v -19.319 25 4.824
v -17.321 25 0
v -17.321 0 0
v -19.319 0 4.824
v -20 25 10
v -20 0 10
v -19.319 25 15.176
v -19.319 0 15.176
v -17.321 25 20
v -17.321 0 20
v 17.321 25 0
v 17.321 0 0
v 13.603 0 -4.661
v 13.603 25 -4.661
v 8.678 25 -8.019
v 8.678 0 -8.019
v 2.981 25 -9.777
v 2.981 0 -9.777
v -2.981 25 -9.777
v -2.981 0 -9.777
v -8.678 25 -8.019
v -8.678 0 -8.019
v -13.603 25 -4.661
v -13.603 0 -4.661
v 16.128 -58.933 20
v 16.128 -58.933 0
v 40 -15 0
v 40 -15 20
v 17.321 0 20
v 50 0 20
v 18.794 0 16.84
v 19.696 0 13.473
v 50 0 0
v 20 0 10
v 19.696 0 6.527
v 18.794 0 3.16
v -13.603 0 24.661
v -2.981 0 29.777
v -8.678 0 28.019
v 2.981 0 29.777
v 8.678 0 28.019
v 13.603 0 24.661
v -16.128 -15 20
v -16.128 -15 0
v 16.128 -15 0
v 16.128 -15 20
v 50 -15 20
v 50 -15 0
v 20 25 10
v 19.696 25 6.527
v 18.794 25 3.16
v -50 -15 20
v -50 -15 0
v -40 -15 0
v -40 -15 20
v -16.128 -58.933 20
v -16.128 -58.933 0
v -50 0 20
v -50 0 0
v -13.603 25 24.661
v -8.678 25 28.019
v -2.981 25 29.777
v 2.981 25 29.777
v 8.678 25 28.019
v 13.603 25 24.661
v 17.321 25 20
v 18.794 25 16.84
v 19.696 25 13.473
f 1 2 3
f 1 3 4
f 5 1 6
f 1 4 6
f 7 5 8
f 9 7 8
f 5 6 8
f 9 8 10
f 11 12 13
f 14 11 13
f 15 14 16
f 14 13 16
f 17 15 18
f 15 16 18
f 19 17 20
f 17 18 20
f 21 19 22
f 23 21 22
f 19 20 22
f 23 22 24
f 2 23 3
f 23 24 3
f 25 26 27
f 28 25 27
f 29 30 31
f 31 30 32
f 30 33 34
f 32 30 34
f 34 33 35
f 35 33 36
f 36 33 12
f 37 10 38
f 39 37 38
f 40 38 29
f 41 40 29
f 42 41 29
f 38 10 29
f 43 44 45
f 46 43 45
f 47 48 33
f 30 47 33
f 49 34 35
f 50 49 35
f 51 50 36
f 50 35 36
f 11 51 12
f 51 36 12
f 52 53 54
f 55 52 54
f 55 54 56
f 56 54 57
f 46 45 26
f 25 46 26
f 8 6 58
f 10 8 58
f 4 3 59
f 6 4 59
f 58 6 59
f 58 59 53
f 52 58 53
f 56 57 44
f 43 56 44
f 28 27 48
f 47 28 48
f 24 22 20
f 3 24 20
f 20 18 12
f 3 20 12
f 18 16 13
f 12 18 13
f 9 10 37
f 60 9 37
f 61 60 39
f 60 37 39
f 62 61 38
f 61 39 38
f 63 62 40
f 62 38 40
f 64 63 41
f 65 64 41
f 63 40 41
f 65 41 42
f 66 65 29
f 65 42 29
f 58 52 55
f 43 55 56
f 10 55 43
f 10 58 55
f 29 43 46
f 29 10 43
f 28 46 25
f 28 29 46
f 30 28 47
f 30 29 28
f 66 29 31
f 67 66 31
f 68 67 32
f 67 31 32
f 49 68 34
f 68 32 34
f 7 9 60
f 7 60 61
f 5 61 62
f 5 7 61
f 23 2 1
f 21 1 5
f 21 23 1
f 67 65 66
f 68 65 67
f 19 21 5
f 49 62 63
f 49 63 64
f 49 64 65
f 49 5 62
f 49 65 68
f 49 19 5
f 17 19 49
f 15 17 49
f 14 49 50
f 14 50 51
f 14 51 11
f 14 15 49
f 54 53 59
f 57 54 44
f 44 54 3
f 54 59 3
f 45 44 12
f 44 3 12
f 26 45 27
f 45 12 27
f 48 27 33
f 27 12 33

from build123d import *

# Parameters (mm, degrees)
EXTRUDE_1_DEPTH = 20
EXTRUDE_2_DEPTH = 25


with BuildPart() as part:
    # 草图3 → 凸台-拉伸1 (new body)
    with BuildSketch(Plane.XY):
        Polygon((0, -15), (0, 0), (-50, 0), (-50, -15), (-40, -15), (-16.127693207, -58.93305098), (-16.127693207, -15), align=None)
        Polygon((50, -15), (50, 0), (0, 0), (0, -15), (16.127693207, -15), (16.127693207, -58.93305098), (40, -15), align=None)
    extrude(amount=EXTRUDE_1_DEPTH)

    # 草图4 → 凸台-拉伸2 (add)
    with BuildSketch(Plane(origin=(0, 0, 0), x_dir=(1, 0, 0), z_dir=(0, 1, 0))):
        with BuildLine():
            Line((17.320508076, -20), (0, -20))
            Line((0, -20), (-17.320508076, -20))
            ThreePointArc((-17.320508076, -20), (0, -30), (17.320508076, -20))
        make_face()
        with BuildLine():
            Line((17.320508076, 0), (0, 0))
            Line((0, 0), (0, -20))
            Line((0, -20), (17.320508076, -20))
            ThreePointArc((17.320508076, -20), (19.318516526, -15.176380902), (20, -10))
            ThreePointArc((20, -10), (19.318516526, -4.823619098), (17.320508076, 0))
        make_face()
        with BuildLine():
            Line((0, -20), (0, 0))
            Line((0, 0), (-17.320508076, 0))
            ThreePointArc((-17.320508076, 0), (-20, -10), (-17.320508076, -20))
            Line((-17.320508076, -20), (0, -20))
        make_face()
        with BuildLine():
            Line((-17.320508076, 0), (0, 0))
            Line((0, 0), (17.320508076, 0))
            ThreePointArc((17.320508076, 0), (0, 10), (-17.320508076, 0))
        make_face()
    extrude(amount=EXTRUDE_2_DEPTH)


solid = part.part
